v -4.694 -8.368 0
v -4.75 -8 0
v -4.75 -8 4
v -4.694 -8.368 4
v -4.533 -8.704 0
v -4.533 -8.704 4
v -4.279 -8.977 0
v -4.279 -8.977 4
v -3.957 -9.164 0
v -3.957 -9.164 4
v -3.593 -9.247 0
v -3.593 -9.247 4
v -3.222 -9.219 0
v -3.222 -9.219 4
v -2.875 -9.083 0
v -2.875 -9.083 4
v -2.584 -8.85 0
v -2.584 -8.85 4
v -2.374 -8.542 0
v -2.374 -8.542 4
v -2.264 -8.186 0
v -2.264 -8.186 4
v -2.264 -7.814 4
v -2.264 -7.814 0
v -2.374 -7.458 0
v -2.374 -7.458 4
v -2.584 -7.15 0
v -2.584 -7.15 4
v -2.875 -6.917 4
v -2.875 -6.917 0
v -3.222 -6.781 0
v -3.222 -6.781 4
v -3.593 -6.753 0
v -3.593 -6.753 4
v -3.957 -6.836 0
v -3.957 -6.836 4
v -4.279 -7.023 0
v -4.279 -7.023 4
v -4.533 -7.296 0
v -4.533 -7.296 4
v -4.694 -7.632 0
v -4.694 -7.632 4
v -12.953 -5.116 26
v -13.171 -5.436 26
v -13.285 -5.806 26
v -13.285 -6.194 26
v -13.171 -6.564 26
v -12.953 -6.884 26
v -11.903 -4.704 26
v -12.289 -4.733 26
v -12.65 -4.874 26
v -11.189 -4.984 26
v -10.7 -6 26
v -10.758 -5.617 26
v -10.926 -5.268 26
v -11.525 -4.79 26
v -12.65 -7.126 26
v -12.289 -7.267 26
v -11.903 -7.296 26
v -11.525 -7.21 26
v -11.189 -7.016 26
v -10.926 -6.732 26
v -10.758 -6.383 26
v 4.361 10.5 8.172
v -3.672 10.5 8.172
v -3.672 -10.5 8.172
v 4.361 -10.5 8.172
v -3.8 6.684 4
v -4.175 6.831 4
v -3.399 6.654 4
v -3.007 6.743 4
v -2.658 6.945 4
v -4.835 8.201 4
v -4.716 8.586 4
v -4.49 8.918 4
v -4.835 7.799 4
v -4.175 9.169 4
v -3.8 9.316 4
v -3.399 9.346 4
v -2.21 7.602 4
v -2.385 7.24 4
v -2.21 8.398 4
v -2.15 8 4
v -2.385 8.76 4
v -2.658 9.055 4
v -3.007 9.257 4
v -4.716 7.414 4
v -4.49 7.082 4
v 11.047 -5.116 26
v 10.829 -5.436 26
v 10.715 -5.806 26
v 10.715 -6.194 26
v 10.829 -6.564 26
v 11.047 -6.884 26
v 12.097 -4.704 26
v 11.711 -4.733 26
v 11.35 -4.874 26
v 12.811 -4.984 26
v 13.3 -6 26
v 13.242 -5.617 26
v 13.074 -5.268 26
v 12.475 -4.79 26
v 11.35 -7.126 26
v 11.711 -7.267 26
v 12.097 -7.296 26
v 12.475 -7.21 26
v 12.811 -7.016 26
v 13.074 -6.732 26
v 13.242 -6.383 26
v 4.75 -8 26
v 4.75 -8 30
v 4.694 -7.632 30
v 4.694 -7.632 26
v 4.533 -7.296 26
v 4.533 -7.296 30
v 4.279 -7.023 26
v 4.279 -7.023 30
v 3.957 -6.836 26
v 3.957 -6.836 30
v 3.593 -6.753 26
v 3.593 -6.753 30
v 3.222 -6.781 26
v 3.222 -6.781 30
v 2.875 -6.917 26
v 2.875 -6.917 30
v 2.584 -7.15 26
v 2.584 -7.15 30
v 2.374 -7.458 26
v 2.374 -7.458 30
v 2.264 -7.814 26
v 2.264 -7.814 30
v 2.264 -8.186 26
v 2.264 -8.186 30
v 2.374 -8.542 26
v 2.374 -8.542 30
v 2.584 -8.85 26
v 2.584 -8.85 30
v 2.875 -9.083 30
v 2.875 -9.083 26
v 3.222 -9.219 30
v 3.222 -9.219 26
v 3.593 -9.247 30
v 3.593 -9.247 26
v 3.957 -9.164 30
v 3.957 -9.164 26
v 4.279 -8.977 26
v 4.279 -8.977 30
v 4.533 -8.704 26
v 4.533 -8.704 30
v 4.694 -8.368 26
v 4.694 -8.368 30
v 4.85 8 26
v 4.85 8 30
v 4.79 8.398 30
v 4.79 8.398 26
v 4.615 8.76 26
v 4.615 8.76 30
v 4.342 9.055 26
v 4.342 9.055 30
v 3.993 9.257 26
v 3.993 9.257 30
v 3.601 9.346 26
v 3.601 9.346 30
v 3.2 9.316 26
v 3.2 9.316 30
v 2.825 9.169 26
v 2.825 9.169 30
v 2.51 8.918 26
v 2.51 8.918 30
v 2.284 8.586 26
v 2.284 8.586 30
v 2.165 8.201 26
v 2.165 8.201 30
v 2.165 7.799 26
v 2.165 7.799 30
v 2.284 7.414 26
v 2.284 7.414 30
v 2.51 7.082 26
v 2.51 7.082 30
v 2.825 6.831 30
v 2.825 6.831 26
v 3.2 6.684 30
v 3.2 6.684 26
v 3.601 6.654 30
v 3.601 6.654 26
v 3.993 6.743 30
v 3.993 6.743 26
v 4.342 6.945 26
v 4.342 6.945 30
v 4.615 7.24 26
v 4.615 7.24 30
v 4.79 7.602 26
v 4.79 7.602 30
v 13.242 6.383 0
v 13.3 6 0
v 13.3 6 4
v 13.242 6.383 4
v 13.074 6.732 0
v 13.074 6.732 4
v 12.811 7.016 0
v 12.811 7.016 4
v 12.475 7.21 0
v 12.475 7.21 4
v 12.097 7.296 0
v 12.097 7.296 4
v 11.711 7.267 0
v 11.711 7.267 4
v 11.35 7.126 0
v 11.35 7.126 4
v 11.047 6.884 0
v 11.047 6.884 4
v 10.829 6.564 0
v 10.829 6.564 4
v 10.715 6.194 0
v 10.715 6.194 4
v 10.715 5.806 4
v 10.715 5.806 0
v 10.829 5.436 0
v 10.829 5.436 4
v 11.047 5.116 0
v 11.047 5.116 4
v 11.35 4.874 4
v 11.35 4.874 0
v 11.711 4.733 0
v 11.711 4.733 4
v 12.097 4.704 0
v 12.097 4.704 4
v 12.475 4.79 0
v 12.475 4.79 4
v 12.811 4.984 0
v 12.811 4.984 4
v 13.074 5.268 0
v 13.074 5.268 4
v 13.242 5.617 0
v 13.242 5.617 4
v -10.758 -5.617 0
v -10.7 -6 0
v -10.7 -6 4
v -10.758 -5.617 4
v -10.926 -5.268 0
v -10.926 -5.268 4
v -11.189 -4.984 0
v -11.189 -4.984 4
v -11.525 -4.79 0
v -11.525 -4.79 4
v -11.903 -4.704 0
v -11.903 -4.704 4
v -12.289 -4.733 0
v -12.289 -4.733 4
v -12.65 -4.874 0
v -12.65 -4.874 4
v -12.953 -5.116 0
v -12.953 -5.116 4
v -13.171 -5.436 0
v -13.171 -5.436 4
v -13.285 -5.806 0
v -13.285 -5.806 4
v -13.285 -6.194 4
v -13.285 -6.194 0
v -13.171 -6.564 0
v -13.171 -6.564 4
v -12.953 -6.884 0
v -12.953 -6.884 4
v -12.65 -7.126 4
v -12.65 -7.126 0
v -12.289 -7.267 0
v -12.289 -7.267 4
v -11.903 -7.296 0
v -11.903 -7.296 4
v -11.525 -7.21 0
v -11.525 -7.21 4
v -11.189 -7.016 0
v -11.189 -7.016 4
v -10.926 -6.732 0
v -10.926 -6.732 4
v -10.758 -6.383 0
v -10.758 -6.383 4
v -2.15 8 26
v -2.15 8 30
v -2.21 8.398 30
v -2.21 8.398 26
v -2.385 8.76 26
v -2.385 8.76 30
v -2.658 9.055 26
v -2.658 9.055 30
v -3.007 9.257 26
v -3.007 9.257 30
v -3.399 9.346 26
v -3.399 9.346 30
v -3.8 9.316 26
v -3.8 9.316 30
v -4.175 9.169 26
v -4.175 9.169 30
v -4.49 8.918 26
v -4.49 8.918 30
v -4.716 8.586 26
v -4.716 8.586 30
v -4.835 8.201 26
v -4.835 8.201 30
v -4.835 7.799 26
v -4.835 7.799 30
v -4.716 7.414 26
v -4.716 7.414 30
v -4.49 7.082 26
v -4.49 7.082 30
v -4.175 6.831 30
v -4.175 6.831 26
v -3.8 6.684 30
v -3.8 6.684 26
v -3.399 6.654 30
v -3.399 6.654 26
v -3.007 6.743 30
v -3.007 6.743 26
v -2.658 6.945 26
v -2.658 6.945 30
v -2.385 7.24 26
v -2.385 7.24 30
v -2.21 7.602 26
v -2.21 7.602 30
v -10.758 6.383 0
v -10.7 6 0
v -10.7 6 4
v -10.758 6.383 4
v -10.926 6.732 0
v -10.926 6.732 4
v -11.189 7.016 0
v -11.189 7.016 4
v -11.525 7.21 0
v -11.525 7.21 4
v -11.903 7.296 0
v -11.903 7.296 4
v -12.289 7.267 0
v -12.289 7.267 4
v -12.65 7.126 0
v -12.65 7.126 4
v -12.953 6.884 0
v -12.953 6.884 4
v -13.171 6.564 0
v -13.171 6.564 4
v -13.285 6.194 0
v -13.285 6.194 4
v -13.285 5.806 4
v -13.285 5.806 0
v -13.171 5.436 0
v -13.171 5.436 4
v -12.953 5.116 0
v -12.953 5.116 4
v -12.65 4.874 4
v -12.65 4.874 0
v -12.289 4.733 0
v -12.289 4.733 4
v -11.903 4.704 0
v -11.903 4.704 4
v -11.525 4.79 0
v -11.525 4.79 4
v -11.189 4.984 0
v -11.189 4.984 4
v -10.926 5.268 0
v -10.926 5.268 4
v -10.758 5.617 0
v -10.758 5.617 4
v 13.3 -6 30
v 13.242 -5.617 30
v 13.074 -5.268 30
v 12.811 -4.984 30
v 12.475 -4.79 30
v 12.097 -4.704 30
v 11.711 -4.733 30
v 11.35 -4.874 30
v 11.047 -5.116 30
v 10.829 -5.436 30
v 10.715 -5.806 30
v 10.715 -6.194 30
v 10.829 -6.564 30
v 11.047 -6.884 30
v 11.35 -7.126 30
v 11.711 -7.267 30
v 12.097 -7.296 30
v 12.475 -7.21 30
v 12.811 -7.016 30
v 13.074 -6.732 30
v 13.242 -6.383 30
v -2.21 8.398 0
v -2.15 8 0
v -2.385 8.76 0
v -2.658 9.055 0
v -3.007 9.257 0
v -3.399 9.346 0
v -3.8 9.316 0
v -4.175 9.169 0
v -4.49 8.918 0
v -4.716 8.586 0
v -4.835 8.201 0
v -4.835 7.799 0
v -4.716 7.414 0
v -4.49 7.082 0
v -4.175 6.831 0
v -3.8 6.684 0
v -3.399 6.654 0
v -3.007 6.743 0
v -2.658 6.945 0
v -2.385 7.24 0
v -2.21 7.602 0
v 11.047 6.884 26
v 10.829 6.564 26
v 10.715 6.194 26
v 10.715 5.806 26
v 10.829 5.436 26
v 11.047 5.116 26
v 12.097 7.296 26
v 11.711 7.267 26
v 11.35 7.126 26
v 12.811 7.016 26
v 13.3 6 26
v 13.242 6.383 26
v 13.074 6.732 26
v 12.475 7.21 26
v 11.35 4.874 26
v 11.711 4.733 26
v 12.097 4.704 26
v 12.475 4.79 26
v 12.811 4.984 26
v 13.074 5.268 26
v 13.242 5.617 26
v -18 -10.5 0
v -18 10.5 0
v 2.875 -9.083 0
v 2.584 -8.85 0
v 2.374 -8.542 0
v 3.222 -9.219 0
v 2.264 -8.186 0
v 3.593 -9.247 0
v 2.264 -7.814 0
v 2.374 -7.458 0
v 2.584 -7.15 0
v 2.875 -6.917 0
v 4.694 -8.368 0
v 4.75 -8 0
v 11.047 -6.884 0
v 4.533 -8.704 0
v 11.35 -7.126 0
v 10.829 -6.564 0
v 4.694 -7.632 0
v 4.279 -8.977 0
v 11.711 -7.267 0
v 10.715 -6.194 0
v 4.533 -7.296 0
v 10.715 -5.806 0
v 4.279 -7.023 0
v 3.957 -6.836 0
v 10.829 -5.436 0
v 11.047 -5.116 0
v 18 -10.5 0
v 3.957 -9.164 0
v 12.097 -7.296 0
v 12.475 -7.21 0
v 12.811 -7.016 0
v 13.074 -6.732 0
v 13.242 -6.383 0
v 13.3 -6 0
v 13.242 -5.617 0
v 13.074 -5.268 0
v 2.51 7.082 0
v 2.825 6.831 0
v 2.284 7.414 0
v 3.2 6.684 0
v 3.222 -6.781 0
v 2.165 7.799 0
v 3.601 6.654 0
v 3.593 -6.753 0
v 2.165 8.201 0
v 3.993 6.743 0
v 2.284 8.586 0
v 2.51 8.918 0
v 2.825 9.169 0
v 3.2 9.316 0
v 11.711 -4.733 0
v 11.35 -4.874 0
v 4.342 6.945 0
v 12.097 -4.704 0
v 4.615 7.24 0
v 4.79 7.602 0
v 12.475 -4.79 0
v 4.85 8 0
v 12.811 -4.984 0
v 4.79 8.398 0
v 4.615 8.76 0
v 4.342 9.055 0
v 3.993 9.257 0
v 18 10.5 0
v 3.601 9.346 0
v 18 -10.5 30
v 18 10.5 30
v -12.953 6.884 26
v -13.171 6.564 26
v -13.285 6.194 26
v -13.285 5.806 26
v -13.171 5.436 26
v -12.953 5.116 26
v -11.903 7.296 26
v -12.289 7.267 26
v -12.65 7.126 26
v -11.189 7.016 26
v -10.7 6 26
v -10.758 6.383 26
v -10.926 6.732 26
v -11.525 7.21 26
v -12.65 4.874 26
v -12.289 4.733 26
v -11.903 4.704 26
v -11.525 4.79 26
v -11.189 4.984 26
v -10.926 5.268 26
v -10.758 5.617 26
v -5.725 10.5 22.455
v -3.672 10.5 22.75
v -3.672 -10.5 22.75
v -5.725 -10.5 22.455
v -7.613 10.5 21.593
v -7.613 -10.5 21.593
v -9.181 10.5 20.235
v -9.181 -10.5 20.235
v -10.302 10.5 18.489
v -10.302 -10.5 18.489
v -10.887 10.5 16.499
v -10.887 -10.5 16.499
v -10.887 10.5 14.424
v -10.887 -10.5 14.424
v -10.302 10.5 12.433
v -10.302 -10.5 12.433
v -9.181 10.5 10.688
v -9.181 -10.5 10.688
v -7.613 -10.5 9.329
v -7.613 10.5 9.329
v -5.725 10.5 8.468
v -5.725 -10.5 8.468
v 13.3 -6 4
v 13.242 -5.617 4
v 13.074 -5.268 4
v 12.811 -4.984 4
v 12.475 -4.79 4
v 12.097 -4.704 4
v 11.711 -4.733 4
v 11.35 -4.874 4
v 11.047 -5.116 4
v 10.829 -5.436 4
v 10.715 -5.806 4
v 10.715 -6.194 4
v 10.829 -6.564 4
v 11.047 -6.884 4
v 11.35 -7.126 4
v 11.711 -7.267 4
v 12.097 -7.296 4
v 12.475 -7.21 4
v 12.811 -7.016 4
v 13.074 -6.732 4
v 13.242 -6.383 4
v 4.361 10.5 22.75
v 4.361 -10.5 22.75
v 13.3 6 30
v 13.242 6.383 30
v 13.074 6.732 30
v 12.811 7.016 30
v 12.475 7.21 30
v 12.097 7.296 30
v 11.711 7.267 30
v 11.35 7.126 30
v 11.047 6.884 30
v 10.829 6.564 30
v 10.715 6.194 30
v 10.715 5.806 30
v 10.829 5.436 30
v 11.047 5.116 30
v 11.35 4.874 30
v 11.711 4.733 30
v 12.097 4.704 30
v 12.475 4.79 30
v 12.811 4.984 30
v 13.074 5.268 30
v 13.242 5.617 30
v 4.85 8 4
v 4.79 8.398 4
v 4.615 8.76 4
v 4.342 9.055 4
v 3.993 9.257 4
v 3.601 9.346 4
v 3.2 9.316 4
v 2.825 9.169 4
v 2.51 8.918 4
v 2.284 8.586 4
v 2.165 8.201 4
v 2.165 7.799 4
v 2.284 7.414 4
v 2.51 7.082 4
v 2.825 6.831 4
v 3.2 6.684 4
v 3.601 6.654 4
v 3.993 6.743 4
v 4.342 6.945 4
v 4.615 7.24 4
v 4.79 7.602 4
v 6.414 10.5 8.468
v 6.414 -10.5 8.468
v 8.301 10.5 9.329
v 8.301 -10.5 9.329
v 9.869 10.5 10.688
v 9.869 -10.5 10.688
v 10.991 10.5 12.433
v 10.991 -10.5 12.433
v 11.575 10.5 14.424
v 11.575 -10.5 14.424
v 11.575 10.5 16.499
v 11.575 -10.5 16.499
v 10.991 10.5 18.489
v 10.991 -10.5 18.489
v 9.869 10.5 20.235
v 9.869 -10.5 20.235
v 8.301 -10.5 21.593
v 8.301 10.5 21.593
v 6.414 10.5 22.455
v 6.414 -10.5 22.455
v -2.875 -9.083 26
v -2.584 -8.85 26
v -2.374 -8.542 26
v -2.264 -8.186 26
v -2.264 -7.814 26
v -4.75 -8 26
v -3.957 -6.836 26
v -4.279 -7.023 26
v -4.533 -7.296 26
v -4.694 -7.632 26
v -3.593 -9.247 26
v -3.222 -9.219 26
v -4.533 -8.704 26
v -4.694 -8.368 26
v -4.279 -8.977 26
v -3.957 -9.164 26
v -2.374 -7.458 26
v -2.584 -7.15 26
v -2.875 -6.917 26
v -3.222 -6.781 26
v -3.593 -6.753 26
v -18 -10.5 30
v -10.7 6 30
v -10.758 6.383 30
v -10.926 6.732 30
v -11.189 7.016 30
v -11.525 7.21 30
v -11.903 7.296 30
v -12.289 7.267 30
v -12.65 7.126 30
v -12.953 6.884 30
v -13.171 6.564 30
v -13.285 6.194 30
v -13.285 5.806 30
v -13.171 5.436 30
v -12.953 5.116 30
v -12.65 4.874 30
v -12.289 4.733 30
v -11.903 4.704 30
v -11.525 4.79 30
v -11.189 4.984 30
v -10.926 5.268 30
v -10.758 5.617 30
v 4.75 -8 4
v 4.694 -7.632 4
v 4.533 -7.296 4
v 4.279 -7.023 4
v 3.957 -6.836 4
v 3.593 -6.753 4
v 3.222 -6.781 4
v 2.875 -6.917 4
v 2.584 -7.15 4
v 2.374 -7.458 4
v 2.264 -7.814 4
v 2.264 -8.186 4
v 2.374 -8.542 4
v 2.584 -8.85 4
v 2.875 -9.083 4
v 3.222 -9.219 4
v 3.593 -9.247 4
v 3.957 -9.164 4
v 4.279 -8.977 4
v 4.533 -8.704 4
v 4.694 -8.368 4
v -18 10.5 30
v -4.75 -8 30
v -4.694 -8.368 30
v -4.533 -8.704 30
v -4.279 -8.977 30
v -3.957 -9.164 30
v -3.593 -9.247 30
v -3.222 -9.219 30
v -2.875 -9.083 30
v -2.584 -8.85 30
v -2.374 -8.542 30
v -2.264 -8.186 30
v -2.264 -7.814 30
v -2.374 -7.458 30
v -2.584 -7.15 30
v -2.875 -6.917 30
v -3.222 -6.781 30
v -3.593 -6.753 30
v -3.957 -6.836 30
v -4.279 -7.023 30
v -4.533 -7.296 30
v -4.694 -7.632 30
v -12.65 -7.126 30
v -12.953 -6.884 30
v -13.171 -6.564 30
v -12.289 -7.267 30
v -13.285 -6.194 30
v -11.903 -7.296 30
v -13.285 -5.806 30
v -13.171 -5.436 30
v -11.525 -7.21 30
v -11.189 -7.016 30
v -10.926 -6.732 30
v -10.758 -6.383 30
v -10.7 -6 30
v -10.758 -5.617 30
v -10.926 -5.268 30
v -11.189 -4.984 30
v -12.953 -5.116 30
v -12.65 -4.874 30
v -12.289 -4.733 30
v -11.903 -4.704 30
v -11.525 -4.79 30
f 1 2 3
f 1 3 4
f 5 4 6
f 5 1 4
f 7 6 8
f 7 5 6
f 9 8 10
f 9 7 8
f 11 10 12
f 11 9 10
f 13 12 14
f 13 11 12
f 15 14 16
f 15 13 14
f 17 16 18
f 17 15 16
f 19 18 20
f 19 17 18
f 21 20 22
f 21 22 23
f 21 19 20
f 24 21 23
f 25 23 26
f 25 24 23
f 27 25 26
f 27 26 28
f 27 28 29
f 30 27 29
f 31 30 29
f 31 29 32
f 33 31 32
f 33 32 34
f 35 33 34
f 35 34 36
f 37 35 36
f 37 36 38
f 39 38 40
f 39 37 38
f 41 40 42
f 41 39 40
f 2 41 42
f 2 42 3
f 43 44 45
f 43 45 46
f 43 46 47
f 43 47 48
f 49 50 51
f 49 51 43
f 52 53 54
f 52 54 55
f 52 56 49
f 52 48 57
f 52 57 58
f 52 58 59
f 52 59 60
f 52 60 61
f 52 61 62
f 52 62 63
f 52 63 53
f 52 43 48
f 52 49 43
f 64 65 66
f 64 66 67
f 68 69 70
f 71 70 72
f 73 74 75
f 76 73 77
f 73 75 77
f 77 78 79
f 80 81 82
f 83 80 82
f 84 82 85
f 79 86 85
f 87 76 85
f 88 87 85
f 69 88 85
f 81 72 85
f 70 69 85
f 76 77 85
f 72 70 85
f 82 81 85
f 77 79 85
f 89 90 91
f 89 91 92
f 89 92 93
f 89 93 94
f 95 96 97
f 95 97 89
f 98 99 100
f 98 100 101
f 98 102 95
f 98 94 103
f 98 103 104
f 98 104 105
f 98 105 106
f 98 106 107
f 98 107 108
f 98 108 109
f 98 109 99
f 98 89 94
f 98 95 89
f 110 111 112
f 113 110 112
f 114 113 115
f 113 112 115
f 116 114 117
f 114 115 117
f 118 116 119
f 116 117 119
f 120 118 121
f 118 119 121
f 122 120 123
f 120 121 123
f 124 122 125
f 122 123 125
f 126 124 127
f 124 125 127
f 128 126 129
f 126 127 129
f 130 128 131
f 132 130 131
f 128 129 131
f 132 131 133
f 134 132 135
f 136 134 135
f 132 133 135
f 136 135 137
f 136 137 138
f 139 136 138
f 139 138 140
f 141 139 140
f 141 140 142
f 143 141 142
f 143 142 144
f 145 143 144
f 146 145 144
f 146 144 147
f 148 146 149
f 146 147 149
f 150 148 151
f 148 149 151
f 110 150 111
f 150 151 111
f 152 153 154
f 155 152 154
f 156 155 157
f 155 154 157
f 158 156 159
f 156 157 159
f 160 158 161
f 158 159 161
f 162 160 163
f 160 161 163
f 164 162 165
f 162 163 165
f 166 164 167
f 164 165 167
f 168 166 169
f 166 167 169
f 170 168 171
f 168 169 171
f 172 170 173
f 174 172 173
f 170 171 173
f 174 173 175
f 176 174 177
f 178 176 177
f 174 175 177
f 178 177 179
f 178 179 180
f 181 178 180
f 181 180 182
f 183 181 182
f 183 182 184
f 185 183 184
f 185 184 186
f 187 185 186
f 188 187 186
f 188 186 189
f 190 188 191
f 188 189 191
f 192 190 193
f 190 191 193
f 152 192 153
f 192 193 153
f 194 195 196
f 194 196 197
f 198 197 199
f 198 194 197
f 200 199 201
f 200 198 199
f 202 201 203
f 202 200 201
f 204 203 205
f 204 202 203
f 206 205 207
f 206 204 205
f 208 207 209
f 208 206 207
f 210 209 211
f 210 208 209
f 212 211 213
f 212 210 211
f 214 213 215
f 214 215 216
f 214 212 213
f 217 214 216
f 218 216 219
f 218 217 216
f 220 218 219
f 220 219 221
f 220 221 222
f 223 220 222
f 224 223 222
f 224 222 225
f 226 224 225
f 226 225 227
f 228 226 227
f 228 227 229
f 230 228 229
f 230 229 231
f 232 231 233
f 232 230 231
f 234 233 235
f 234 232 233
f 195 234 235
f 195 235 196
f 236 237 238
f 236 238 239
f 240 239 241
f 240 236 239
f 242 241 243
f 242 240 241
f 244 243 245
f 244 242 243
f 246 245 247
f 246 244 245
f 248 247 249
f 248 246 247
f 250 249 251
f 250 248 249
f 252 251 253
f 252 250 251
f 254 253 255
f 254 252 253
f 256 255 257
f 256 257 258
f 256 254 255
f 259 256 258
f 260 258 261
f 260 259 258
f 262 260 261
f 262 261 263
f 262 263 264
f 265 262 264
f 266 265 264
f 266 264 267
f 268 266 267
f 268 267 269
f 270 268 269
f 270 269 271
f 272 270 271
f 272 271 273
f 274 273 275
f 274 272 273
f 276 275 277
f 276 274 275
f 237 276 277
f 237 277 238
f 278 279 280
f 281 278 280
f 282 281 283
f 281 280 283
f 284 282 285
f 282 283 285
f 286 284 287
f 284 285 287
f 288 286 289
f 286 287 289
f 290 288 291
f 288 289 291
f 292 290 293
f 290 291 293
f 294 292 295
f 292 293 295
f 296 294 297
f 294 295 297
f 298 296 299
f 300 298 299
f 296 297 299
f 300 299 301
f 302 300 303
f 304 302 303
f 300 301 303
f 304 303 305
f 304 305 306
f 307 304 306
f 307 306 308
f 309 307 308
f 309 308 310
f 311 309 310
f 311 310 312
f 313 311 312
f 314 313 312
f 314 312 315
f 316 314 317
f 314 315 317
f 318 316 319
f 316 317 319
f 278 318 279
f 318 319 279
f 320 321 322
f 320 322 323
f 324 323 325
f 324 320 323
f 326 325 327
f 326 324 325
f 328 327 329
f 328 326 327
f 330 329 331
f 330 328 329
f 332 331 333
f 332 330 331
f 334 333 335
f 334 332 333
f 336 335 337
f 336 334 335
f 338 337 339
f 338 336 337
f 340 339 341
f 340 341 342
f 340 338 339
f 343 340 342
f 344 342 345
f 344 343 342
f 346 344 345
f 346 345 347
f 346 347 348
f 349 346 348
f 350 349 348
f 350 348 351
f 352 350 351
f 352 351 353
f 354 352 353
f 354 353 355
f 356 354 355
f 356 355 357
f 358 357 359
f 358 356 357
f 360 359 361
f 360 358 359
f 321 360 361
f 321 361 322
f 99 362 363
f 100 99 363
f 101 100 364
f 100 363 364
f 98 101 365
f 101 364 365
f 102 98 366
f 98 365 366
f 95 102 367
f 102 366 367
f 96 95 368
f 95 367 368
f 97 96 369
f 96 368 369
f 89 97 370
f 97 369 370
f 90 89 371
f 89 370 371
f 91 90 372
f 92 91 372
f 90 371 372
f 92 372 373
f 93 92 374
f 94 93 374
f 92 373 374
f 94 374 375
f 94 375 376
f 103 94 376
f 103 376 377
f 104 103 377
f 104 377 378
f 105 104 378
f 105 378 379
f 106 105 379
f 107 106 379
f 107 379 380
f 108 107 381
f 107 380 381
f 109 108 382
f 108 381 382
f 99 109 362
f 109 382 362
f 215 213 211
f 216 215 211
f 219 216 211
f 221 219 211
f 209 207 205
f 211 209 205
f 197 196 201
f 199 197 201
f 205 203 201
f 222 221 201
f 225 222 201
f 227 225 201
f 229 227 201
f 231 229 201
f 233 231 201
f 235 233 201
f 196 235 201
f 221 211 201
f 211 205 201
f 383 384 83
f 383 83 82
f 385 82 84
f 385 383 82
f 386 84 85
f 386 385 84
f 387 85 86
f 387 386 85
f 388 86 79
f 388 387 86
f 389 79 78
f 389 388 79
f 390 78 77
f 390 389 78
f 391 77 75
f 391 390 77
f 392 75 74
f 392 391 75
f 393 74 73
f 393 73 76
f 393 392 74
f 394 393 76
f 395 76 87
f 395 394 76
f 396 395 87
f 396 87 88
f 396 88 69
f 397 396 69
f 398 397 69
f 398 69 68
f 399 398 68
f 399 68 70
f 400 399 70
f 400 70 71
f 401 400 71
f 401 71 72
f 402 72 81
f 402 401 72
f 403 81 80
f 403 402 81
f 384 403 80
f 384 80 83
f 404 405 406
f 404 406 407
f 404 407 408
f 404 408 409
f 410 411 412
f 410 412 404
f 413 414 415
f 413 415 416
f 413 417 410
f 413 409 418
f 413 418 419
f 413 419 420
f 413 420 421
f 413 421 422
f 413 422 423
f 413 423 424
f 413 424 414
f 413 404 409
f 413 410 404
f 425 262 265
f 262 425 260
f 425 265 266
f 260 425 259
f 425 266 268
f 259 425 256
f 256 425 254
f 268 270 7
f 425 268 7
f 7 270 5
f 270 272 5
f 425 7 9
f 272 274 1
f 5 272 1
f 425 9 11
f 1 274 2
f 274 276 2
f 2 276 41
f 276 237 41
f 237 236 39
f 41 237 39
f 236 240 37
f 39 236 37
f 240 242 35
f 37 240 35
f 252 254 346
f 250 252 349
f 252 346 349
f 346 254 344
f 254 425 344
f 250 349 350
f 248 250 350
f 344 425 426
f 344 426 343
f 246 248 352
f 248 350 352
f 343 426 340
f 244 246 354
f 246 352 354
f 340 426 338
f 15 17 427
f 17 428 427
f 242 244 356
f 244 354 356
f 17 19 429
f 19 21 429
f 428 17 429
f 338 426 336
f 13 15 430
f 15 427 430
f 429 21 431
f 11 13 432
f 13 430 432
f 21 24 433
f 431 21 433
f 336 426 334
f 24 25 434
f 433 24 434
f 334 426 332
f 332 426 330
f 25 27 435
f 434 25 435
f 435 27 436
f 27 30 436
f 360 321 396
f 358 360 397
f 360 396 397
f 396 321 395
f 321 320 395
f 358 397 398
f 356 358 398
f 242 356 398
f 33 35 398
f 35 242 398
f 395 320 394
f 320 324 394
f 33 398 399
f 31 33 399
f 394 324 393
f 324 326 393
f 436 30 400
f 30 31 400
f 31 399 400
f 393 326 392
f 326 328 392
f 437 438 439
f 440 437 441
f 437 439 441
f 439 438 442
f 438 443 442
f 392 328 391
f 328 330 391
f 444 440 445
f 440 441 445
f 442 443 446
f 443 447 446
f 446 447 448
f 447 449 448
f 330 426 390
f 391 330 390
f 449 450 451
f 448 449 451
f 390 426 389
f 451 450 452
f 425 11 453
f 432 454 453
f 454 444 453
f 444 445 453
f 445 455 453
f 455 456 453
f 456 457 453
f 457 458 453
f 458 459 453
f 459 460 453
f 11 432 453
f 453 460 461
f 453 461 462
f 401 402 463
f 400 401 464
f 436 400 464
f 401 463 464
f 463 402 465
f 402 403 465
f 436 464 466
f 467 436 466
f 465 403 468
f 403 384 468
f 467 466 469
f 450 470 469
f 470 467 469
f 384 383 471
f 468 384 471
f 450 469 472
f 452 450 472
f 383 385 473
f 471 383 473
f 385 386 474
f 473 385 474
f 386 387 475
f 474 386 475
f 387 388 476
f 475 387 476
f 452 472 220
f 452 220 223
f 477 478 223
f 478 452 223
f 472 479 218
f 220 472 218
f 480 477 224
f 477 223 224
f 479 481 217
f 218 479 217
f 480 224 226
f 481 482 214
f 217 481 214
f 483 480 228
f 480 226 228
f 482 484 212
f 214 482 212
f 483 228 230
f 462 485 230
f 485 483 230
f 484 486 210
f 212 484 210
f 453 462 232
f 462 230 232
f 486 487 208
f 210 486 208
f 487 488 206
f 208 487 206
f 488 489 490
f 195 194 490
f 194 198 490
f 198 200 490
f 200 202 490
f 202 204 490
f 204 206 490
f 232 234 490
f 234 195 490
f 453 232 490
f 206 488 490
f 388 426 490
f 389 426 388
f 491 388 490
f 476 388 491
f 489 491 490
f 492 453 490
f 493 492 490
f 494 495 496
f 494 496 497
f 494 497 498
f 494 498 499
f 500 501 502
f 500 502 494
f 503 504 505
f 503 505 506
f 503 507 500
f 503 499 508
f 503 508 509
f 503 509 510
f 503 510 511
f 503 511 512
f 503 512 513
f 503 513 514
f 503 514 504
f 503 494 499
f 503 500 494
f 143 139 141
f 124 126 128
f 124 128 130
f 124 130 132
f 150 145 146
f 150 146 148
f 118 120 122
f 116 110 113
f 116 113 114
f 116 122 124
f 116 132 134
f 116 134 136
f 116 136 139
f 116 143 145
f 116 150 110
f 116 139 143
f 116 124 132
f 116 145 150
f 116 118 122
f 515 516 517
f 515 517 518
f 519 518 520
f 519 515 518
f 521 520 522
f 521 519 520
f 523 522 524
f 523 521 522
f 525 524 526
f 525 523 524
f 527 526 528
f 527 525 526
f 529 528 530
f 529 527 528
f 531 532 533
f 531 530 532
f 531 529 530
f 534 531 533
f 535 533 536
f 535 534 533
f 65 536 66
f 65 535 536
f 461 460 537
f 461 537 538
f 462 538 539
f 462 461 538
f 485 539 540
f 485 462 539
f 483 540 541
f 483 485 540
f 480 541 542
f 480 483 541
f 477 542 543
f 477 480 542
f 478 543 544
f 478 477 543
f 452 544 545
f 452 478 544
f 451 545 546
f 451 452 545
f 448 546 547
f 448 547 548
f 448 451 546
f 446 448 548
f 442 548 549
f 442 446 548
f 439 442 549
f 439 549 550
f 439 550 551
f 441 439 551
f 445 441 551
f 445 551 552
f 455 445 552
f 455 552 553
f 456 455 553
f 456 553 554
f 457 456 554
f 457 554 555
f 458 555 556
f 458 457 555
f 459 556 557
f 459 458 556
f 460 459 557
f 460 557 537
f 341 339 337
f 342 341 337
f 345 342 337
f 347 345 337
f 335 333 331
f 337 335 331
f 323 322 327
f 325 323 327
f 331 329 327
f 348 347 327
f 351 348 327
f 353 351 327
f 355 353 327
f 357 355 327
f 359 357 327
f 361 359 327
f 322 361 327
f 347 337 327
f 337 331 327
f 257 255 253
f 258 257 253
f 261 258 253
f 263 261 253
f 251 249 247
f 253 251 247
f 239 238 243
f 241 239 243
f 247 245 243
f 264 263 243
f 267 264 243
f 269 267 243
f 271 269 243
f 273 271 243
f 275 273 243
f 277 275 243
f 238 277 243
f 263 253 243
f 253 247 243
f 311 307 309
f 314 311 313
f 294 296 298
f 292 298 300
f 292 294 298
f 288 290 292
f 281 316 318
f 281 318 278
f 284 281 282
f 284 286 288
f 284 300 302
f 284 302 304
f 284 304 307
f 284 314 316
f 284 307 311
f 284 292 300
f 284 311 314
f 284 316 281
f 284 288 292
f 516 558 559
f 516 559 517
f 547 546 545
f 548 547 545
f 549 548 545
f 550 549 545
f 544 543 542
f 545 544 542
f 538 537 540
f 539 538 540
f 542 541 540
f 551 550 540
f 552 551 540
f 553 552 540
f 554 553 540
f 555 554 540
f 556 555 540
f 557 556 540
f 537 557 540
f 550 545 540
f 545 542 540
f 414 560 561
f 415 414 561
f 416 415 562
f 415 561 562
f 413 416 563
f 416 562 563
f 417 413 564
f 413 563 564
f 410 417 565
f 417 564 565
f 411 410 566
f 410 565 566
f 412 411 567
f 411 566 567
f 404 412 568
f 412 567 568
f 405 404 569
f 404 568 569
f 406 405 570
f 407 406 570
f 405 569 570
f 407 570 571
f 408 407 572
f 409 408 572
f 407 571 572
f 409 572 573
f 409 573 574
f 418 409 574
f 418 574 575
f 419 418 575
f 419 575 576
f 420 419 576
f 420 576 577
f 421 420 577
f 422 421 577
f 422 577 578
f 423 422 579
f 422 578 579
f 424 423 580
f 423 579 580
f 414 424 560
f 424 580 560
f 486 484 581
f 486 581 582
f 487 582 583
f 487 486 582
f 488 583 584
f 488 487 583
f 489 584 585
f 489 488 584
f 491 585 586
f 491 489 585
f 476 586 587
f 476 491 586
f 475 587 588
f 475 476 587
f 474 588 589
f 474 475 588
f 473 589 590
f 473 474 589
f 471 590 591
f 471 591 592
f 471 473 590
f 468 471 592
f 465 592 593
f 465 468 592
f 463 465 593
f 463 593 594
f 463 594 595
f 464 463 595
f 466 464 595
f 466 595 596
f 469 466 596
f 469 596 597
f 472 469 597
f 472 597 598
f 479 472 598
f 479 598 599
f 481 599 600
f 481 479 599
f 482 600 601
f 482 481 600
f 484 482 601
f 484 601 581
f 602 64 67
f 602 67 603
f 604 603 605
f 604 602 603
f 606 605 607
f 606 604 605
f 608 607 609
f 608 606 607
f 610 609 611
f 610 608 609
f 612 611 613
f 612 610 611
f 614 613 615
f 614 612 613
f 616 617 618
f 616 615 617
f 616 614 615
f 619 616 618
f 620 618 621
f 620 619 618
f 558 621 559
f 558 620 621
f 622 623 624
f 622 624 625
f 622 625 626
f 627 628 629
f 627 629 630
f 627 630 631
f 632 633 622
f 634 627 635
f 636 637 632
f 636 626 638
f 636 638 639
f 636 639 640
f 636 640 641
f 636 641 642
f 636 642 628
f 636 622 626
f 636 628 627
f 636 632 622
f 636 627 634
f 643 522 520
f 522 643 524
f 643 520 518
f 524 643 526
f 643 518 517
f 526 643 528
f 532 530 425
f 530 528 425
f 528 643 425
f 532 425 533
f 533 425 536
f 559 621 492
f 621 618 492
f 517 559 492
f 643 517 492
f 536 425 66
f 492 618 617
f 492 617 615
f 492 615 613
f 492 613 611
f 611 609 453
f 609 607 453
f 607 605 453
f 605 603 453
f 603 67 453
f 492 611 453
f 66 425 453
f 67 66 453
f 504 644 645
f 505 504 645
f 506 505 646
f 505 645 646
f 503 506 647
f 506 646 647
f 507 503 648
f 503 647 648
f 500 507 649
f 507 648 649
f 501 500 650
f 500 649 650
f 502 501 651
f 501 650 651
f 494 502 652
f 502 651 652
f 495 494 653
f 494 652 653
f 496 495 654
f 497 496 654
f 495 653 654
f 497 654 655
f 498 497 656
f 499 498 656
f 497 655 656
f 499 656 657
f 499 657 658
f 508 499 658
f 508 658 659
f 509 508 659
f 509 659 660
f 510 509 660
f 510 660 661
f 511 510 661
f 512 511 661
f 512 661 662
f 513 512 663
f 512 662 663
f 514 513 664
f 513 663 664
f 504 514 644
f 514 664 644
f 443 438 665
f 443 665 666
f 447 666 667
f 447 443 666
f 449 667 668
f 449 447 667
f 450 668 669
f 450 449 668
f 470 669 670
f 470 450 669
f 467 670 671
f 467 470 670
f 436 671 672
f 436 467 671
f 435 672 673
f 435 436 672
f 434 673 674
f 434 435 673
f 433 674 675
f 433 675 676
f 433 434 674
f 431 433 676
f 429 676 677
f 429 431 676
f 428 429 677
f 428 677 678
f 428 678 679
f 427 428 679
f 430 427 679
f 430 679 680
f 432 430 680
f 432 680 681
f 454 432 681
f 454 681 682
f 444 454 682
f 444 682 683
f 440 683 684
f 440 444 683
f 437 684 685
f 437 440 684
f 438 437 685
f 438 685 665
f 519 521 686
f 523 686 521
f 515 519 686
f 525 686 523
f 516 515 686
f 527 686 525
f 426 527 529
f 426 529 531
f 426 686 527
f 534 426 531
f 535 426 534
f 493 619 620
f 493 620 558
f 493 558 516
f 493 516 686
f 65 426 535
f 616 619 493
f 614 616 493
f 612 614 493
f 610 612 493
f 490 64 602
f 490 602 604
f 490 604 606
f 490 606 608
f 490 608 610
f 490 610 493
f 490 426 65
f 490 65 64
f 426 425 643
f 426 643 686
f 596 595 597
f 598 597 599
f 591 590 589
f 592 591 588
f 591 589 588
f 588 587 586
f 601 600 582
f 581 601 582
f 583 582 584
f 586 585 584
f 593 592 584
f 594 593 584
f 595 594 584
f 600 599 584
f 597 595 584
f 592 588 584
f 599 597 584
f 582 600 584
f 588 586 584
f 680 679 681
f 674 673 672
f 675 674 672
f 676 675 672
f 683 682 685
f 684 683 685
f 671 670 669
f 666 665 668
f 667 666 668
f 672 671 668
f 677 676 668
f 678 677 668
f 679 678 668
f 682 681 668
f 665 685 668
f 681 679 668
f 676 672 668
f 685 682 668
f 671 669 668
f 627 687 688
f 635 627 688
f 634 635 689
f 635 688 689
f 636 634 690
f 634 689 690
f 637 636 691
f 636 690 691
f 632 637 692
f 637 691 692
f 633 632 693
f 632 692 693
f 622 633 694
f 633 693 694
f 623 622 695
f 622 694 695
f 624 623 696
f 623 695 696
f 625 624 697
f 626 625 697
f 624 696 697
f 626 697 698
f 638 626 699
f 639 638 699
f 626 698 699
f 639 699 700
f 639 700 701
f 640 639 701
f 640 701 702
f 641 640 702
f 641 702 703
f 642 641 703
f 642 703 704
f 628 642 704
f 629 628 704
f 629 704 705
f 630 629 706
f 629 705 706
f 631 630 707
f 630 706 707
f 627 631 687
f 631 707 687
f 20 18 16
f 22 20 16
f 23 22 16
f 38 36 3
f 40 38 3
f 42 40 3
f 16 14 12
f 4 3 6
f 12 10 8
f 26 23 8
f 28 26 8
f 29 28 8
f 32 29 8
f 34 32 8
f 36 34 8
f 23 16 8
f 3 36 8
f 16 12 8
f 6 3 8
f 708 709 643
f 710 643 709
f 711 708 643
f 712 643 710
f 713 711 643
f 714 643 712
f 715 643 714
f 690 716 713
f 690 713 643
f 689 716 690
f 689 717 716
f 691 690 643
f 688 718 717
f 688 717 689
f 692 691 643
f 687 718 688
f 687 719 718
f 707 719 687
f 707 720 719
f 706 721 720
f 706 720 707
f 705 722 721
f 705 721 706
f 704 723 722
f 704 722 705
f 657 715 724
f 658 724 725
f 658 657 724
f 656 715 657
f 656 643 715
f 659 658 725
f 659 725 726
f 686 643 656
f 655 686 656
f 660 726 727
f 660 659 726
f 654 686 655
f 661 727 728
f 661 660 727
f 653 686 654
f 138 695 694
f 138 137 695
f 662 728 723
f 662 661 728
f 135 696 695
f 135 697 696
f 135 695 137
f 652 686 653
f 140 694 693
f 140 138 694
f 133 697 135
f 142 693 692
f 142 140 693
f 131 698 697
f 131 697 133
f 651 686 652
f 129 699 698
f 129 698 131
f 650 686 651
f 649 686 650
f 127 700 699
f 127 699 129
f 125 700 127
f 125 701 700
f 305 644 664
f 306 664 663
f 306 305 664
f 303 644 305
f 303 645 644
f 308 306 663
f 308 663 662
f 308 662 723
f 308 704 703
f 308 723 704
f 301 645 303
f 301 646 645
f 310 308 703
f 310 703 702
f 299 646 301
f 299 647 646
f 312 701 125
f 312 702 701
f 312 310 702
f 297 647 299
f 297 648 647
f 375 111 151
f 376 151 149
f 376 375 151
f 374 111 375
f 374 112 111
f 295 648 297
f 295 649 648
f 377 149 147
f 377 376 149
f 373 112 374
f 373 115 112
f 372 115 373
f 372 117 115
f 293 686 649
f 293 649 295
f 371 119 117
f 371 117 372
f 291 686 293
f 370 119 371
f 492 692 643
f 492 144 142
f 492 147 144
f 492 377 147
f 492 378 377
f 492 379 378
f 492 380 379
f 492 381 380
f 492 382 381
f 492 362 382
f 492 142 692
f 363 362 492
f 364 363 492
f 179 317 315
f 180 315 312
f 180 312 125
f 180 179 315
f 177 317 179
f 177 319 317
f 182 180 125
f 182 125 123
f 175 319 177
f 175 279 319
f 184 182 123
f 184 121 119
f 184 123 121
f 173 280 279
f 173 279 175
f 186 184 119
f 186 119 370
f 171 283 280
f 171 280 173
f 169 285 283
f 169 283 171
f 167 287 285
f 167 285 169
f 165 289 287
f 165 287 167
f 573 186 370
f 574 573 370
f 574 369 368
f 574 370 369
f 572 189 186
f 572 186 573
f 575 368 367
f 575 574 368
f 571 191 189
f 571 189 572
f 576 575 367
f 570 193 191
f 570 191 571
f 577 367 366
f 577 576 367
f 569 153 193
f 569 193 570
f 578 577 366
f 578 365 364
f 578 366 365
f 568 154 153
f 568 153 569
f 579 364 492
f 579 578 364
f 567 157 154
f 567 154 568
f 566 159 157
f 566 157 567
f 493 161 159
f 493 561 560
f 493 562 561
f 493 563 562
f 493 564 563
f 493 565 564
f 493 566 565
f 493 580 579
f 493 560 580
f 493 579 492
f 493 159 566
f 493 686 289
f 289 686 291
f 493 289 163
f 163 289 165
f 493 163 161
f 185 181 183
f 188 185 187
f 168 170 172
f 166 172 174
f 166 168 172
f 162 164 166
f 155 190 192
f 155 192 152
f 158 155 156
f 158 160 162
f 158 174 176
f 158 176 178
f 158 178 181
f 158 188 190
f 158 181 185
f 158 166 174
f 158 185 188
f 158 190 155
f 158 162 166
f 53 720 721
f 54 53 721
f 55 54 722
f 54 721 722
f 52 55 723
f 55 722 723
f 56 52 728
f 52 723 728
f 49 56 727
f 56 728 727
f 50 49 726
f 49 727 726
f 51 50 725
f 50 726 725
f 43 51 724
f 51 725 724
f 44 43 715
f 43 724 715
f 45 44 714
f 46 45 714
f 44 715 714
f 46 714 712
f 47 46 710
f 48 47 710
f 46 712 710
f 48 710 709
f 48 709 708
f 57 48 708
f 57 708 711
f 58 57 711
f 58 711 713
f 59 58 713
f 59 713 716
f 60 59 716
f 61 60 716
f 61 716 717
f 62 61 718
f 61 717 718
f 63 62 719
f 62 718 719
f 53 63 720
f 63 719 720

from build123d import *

# Parameters (mm, degrees)
SKETCH_1_W          = 36
SKETCH_1_H          = 21
SKETCH_1_R          = 1.25
SKETCH_1_R_2        = 1.3
SKETCH_1_R_3        = 1.35
EXTRUDE_1_DEPTH     = 30
SKETCH_1_5_R        = 1.3
SKETCH_1_5_R_2      = 1.35
SKETCH_1_5_R_3      = 1.25
CUT_EXTRUDE_1_DEPTH = 4
CUT_EXTRUDE_START   = 30
SKETCH_1_6_R        = 1.35
SKETCH_1_6_R_2      = 1.3
SKETCH_1_6_R_3      = 1.25
CUT_EXTRUDE_2_DEPTH = 4
CUT_EXTRUDE1_DEPTH  = 30


with BuildPart() as part:
    # 스케치1 → 보스-돌출1 (new body)
    with BuildSketch(Plane.XY):
        Rectangle(SKETCH_1_W, SKETCH_1_H)
        with Locations((-3.5, -8)):
            Circle(SKETCH_1_R, mode=Mode.SUBTRACT)
        with Locations((3.5, -8)):
            Circle(SKETCH_1_R, mode=Mode.SUBTRACT)
        with Locations((-12, 6)):
            Circle(SKETCH_1_R_2, mode=Mode.SUBTRACT)
        with Locations((12, 6)):
            Circle(SKETCH_1_R_2, mode=Mode.SUBTRACT)
        with Locations((12, -6)):
            Circle(SKETCH_1_R_2, mode=Mode.SUBTRACT)
        with Locations((-12, -6)):
            Circle(SKETCH_1_R_2, mode=Mode.SUBTRACT)
        with Locations((3.5, 8)):
            Circle(SKETCH_1_R_3, mode=Mode.SUBTRACT)
        with Locations((-3.5, 8)):
            Circle(SKETCH_1_R_3, mode=Mode.SUBTRACT)
        with Locations((12, -6)):
            Circle(SKETCH_1_R_2)
        with Locations((3.5, -8)):
            Circle(SKETCH_1_R)
        with Locations((-3.5, -8)):
            Circle(SKETCH_1_R)
        with Locations((-12, -6)):
            Circle(SKETCH_1_R_2)
        with Locations((-12, 6)):
            Circle(SKETCH_1_R_2)
        with Locations((-3.5, 8)):
            Circle(SKETCH_1_R_3)
        with Locations((3.5, 8)):
            Circle(SKETCH_1_R_3)
        with Locations((12, 6)):
            Circle(SKETCH_1_R_2)
    extrude(amount=EXTRUDE_1_DEPTH)

    # 스케치1<5> → 컷-돌출1 (cut)
    with BuildSketch(Plane.XY):
        with Locations((12, 6)):
            Circle(SKETCH_1_5_R)
        with Locations((3.5, 8)):
            Circle(SKETCH_1_5_R_2)
        with Locations((-3.5, 8)):
            Circle(SKETCH_1_5_R_2)
        with Locations((-12, 6)):
            Circle(SKETCH_1_5_R)
        with Locations((-12, -6)):
            Circle(SKETCH_1_5_R)
        with Locations(Location((-3.5, -8, 0), (0, 0, 180))):
            Circle(SKETCH_1_5_R_3)
        with Locations((3.5, -8)):
            Circle(SKETCH_1_5_R_3)
        with Locations((12, -6)):
            Circle(SKETCH_1_5_R)
    extrude(amount=CUT_EXTRUDE_1_DEPTH, mode=Mode.SUBTRACT)

    # 스케치1<6> → 컷-돌출2 (cut)
    with BuildSketch(Plane.XY.offset(CUT_EXTRUDE_START)):
        with Locations((3.5, 8)):
            Circle(SKETCH_1_6_R)
        with Locations((12, 6)):
            Circle(SKETCH_1_6_R_2)
        with Locations((-3.5, 8)):
            Circle(SKETCH_1_6_R)
        with Locations((-12, 6)):
            Circle(SKETCH_1_6_R_2)
        with Locations((-12, -6)):
            Circle(SKETCH_1_6_R_2)
        with Locations(Location((-3.5, -8, 0), (0, 0, 180))):
            Circle(SKETCH_1_6_R_3)
        with Locations((3.5, -8)):
            Circle(SKETCH_1_6_R_3)
        with Locations((12, -6)):
            Circle(SKETCH_1_6_R_2)
    extrude(amount=-CUT_EXTRUDE_2_DEPTH, mode=Mode.SUBTRACT)

    # Sketch2 → Cut-Extrude1 (cut)
    with BuildSketch(Plane(origin=(0, 10.5, 0), x_dir=(1, 0, 0), z_dir=(0, 1, 0))):
        with BuildLine():
            Line((-3.671911896, -8.172290791), (4.36058603, -8.172290791))
            ThreePointArc((4.36058603, -8.172290791), (11.649583923, -15.461288684), (4.36058603, -22.750286576))
            Line((4.36058603, -22.750286576), (-3.671911896, -22.750286576))
            ThreePointArc((-3.671911896, -22.750286576), (-10.960909789, -15.461288684), (-3.671911896, -8.172290791))
        make_face()
    extrude(amount=-CUT_EXTRUDE1_DEPTH, mode=Mode.SUBTRACT)


solid = part.part
